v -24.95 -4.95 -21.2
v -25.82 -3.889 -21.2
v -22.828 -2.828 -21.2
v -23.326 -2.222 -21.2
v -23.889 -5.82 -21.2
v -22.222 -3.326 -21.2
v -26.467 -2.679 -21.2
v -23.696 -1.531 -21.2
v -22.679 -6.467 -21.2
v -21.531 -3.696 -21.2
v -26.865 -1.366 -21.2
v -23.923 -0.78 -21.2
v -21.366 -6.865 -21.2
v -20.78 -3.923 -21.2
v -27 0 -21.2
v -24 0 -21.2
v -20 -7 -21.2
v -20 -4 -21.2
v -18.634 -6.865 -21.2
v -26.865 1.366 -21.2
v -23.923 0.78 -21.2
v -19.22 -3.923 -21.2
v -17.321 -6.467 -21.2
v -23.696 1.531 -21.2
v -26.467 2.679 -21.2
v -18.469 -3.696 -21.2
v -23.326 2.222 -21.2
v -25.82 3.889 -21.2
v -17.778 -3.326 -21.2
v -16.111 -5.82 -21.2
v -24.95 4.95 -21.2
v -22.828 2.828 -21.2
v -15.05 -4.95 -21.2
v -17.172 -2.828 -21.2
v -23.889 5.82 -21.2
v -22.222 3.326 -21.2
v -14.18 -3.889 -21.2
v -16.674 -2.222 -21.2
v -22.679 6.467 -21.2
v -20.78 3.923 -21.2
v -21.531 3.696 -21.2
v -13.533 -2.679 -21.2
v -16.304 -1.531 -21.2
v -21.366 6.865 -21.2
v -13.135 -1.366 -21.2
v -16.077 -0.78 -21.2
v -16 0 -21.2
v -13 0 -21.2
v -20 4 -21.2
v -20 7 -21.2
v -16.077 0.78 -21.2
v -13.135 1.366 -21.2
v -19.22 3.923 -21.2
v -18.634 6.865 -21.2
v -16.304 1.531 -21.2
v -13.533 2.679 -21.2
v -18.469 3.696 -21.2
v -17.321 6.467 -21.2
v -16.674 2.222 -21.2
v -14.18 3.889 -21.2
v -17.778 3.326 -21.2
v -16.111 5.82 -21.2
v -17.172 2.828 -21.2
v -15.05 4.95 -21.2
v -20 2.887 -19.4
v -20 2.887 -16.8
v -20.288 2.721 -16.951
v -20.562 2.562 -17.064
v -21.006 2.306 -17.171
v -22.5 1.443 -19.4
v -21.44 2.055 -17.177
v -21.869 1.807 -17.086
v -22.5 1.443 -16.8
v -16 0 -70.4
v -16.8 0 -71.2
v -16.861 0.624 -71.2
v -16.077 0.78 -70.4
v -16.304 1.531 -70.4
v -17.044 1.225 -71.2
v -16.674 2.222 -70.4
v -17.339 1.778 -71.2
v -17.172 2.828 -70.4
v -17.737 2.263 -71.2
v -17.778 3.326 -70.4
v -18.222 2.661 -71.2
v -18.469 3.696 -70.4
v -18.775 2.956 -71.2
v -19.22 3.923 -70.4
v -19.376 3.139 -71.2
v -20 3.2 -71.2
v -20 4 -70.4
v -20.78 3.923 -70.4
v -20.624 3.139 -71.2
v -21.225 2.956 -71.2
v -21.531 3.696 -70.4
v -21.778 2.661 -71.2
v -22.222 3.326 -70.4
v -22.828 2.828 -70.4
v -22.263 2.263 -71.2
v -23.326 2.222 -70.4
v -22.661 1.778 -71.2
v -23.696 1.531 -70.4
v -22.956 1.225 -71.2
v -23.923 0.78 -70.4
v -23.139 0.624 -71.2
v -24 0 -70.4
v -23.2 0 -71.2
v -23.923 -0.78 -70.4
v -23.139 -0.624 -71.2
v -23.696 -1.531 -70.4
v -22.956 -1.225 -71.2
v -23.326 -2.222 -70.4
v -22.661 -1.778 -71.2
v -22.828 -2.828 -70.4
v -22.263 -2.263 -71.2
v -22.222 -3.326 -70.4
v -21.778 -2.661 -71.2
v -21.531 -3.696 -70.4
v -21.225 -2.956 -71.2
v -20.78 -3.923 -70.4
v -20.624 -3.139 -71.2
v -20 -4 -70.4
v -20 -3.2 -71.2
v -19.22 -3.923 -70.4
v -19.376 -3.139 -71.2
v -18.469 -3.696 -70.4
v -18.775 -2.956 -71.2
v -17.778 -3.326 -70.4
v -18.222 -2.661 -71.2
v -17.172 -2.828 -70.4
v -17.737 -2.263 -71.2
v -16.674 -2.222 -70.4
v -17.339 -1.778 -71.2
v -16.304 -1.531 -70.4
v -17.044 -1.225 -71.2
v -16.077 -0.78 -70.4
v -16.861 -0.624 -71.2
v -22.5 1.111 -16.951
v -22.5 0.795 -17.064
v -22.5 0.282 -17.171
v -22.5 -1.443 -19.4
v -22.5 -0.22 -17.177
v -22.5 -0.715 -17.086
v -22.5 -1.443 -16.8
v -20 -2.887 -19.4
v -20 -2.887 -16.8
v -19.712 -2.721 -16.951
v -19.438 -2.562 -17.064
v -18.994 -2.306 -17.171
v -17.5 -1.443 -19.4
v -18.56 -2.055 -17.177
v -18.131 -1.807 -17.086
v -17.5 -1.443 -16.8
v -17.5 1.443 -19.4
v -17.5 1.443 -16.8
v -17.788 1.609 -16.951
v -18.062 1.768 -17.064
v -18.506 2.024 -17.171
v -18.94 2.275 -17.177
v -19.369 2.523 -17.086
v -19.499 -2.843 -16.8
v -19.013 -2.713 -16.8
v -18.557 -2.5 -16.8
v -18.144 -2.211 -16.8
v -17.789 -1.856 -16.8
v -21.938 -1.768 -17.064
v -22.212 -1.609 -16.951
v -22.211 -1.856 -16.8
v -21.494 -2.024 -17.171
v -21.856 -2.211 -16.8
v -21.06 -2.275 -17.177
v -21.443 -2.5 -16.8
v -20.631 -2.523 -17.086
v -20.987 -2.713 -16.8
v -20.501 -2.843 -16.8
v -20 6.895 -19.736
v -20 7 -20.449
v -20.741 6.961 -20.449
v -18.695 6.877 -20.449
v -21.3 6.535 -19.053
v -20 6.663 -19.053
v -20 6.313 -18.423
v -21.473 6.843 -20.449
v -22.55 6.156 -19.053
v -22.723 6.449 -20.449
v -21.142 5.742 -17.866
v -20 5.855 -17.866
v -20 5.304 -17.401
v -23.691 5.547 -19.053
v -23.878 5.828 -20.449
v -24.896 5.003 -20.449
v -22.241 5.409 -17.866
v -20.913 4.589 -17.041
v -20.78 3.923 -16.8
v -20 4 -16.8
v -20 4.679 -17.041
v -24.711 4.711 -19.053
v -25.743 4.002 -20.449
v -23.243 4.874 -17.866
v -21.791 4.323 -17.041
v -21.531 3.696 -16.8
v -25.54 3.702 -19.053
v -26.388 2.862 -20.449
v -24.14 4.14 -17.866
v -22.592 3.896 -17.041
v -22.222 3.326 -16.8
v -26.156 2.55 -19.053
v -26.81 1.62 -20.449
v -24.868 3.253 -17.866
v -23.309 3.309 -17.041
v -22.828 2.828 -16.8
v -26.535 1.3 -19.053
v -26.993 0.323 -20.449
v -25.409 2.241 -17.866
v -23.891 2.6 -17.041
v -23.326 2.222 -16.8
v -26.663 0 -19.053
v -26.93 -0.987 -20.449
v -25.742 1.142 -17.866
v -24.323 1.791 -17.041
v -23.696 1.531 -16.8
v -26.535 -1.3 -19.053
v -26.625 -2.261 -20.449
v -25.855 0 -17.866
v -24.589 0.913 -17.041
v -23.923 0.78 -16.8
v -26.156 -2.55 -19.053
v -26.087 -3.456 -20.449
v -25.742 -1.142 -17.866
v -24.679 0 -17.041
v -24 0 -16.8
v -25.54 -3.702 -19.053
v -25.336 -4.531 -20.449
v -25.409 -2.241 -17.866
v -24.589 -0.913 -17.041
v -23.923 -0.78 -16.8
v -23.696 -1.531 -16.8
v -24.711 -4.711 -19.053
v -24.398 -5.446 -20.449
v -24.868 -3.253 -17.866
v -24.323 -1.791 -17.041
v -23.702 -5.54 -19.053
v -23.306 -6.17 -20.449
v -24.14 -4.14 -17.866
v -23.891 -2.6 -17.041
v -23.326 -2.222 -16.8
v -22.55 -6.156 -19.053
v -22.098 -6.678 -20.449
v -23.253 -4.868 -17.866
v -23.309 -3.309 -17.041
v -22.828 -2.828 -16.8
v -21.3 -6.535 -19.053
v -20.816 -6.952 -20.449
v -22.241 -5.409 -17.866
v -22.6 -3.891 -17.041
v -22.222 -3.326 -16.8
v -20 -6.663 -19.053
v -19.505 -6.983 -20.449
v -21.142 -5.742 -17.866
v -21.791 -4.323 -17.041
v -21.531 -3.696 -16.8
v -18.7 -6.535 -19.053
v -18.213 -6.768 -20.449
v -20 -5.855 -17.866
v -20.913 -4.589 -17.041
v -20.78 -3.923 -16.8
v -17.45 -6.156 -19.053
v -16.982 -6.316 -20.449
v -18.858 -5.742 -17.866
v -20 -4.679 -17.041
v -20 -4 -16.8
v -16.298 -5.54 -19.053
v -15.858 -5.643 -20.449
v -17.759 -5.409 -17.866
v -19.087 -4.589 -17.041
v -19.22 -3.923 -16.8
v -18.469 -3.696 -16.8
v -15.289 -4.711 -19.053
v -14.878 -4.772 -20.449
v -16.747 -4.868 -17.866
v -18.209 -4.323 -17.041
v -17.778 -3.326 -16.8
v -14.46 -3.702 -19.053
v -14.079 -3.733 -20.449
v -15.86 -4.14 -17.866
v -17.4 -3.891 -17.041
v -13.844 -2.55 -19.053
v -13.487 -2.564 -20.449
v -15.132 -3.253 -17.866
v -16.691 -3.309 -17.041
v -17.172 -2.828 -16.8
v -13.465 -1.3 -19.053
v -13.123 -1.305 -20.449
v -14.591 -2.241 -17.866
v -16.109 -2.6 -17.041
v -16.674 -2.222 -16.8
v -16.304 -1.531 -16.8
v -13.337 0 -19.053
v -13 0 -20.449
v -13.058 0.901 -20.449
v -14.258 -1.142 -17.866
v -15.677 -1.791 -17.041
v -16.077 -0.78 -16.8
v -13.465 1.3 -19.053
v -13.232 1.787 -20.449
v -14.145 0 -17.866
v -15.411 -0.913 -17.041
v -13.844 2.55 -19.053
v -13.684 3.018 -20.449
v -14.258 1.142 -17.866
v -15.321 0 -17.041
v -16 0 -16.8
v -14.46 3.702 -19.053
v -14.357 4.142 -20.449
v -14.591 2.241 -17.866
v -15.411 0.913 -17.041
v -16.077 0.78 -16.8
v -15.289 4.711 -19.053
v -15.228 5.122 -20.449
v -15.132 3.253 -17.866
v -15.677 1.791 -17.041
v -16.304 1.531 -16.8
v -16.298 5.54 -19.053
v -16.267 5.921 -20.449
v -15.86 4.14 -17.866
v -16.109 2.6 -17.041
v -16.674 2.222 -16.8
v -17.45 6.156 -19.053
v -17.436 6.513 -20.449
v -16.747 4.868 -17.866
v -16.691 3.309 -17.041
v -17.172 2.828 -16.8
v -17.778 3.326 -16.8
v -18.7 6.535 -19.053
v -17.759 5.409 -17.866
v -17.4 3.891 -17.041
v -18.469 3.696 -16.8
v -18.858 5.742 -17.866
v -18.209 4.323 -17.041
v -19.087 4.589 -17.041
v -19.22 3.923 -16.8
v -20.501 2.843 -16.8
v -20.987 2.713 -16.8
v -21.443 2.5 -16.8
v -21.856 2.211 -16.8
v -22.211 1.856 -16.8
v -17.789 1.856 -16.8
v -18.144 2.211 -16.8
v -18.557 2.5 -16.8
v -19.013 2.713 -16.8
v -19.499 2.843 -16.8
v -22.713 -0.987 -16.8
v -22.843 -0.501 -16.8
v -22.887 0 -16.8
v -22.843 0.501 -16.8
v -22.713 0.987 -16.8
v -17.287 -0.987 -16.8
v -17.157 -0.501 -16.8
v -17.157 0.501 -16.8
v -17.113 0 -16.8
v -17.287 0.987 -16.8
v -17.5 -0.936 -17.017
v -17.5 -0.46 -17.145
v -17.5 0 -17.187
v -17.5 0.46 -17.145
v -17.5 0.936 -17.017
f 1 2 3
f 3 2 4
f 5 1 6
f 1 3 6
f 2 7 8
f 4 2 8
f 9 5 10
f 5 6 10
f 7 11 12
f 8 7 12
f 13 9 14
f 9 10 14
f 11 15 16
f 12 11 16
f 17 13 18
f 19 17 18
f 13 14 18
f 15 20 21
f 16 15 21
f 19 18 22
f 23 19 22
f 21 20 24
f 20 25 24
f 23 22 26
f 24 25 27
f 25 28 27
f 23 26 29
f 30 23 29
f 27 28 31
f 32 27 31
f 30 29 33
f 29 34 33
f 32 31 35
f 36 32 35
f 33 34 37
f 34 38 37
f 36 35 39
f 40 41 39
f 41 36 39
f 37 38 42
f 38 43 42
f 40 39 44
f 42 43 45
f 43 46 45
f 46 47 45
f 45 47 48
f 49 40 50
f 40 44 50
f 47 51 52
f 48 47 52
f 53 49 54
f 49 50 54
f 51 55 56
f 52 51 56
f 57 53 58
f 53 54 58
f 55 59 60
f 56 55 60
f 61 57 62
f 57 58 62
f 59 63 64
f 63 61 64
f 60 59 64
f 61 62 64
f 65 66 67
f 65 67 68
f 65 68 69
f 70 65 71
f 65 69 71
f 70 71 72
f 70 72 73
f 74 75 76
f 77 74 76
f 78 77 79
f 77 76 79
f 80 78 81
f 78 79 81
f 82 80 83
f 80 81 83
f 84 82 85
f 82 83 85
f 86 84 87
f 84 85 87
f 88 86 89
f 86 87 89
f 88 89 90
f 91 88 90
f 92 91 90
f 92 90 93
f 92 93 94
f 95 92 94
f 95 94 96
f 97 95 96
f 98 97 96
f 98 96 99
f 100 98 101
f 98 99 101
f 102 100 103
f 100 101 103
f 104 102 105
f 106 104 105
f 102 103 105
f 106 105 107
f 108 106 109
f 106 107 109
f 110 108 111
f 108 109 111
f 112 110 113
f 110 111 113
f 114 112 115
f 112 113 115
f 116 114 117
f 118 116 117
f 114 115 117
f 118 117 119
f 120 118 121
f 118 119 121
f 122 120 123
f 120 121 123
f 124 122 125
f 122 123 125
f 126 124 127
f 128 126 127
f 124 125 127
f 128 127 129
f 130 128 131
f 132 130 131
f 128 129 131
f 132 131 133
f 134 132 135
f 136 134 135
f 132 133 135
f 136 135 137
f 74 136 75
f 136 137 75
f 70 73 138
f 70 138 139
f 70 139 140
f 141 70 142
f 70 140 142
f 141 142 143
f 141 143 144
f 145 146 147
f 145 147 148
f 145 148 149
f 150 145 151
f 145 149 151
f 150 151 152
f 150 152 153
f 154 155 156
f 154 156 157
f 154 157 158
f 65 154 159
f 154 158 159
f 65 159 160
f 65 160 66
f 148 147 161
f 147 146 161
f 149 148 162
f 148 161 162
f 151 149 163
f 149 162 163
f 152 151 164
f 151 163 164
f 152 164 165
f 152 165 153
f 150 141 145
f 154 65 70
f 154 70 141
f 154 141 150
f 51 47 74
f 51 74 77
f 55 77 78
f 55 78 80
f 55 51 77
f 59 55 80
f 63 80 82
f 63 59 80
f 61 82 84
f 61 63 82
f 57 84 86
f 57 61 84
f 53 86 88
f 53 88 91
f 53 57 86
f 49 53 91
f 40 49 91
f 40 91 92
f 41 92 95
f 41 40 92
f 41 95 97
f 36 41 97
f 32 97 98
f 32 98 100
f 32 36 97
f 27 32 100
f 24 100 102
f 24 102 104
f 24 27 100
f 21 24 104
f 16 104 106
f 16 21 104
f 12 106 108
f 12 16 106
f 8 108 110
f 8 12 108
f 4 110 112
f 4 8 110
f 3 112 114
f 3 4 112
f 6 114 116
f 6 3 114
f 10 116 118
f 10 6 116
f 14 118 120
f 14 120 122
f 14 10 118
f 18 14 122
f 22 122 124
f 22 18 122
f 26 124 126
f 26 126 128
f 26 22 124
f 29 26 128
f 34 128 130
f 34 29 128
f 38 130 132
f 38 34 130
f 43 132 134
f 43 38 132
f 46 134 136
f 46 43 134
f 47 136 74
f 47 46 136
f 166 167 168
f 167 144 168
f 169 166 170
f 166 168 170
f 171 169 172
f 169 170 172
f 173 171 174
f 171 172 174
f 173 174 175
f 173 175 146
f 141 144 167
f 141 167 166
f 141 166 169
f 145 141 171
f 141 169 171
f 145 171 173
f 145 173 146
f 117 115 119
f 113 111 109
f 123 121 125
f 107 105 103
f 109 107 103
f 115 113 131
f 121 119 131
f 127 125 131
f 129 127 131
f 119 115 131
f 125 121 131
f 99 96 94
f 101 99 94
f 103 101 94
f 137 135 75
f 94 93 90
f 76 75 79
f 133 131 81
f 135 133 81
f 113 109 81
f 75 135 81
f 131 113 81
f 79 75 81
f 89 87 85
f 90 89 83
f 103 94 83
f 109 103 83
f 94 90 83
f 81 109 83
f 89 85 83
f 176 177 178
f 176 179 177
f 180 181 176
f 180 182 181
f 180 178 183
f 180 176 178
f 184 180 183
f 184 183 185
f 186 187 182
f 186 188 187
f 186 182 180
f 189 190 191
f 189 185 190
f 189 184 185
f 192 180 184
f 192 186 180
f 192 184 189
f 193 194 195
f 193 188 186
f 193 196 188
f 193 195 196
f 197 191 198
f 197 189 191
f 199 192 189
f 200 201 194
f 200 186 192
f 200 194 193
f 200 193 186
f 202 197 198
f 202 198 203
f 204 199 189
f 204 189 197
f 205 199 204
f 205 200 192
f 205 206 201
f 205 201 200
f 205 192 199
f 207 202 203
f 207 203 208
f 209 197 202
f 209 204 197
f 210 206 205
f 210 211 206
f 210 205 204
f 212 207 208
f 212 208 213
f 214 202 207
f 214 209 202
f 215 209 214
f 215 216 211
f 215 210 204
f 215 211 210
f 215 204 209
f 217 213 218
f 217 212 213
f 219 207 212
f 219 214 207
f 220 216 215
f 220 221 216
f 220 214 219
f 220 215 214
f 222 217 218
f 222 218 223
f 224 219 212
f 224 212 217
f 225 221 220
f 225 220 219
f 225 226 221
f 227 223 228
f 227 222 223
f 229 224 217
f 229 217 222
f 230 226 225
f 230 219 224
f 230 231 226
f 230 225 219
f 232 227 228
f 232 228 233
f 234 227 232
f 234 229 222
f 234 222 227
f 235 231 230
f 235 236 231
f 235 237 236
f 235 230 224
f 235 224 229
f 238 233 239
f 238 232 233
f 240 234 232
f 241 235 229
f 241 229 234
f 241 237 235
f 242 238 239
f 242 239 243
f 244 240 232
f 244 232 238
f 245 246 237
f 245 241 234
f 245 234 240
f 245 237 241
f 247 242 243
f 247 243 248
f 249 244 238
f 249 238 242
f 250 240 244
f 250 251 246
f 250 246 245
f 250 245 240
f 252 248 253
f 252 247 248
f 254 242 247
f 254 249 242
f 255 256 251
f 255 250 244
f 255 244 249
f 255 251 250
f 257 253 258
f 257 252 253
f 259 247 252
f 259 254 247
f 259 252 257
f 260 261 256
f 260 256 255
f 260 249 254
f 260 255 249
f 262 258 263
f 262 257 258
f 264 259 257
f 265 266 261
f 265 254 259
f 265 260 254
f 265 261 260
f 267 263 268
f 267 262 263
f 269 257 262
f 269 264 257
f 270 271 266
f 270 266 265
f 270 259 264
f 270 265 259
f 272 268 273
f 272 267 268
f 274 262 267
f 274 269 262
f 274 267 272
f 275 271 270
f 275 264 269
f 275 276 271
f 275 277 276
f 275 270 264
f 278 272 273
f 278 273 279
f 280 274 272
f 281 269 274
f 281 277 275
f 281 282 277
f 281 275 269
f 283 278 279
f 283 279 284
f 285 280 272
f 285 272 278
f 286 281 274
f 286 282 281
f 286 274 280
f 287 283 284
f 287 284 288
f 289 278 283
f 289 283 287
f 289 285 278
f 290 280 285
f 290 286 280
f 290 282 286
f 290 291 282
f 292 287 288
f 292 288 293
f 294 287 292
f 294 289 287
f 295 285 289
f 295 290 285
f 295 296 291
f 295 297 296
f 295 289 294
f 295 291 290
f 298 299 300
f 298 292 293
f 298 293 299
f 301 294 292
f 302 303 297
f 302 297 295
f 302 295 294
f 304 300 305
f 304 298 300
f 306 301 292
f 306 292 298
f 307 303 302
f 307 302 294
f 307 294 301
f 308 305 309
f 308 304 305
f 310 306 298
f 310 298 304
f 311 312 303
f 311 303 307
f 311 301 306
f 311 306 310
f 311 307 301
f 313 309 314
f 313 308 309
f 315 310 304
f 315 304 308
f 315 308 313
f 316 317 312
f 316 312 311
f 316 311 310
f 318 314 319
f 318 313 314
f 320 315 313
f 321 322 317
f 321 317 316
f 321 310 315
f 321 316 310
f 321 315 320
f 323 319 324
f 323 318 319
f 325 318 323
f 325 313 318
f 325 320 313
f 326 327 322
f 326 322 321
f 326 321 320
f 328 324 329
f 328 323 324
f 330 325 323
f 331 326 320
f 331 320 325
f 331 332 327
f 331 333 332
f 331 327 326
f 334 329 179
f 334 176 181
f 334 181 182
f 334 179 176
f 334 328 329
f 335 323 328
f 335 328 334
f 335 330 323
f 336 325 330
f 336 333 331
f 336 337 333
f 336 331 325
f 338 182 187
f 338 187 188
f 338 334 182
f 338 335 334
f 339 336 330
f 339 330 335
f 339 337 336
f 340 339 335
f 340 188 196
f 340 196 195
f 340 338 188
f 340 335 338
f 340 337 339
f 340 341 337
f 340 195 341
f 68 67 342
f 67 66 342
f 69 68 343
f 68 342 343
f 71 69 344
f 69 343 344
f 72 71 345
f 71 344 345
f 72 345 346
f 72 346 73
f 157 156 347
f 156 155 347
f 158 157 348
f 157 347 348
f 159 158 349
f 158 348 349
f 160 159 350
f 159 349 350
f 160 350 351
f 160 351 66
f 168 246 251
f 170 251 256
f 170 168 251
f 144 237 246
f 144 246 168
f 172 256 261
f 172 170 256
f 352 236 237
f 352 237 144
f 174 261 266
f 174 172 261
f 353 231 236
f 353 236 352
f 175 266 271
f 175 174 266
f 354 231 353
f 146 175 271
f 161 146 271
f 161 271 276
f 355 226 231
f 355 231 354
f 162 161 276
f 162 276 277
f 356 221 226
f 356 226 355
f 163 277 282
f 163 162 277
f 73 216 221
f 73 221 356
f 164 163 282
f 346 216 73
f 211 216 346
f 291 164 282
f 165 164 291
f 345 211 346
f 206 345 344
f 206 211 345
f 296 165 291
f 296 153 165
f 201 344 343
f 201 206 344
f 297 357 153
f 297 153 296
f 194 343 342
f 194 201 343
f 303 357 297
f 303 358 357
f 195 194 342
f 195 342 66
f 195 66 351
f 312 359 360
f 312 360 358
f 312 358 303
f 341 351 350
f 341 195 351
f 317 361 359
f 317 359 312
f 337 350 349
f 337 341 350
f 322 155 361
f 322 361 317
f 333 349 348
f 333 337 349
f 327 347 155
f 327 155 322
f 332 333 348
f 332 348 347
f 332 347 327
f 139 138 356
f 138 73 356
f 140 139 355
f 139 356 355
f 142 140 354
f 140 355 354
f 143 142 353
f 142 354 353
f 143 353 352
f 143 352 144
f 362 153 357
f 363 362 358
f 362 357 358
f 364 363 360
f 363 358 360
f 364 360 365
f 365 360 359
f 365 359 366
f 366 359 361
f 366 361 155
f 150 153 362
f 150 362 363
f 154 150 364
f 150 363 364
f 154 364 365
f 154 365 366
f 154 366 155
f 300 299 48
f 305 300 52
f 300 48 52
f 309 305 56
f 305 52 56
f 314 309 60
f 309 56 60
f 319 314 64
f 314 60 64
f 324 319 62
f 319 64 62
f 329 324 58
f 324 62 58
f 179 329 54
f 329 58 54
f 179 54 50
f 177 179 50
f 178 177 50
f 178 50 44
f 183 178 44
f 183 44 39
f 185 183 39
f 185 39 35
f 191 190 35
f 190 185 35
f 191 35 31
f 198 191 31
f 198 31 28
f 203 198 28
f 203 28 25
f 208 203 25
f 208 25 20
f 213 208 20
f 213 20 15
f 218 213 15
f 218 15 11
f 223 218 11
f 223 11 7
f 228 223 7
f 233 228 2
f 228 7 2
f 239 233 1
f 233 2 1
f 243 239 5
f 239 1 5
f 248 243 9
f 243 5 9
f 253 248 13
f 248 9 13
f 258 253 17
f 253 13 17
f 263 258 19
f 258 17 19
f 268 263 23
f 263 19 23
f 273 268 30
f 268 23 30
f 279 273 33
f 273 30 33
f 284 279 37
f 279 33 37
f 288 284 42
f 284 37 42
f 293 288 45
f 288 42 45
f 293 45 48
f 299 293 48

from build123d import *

# Parameters (mm, degrees)
BOSS_EXTRUDE1_START = -21.2
SKETCH1_R           = 4
BOSS_EXTRUDE1_DEPTH = 50
SKETCH2_R           = 7
BOSS_EXTRUDE2_DEPTH = 4.4
CUT_EXTRUDE1_DEPTH  = 2.6
SKETCH5_R           = 2.886751346
CUT_EXTRUDE2_DEPTH  = 1
CUT_EXTRUDE2_DRAFT  = -45
CHAMFER1_SIZE       = 0.8


with BuildPart() as part:
    # Sketch1 → Boss-Extrude1 (new body)
    with BuildSketch(Plane.XY.offset(BOSS_EXTRUDE1_START)):
        with Locations((-20, 0)):
            Circle(SKETCH1_R)
    extrude(amount=-BOSS_EXTRUDE1_DEPTH)

    # Sketch2 → Boss-Extrude2 (add)
    with BuildSketch(Plane.XY.offset(-21.2)):
        with Locations((-20, 0)):
            Circle(SKETCH2_R)
    extrude(amount=BOSS_EXTRUDE2_DEPTH)

    # Sketch3 → Cut-Revolve1 (revolve, cut)
    with BuildSketch(Plane(origin=(-20, 0, 0), x_dir=(0, 0, -1), z_dir=(1, 0, 0))):
        with BuildLine():
            Line((16.8, 4), (15.8, 4))
            Line((15.8, 4), (15.8, 8))
            Line((15.8, 8), (20.9, 8))
            Line((20.9, 8), (20.9, 7))
            ThreePointArc((20.9, 7), (18.312578573, 6.23447595), (16.8, 4))
        make_face()
    revolve(axis=Axis((-20, 0, -71.2), (0, 0, 1)), mode=Mode.SUBTRACT)

    # Sketch4 → Cut-Extrude1 (cut)
    with BuildSketch(Plane.XY.offset(-16.8)):
        Polygon((-20, 2.886751346), (-22.5, 1.443375673), (-22.5, -1.443375673), (-20, -2.886751346), (-17.5, -1.443375673), (-17.5, 1.443375673), align=None)
    extrude(amount=-CUT_EXTRUDE1_DEPTH, mode=Mode.SUBTRACT)


with BuildPart() as cut_extrude2_tool:
    # Sketch5 → Cut-Extrude2 (with draft: the straight prism first)
    with BuildSketch(Plane.XY.offset(-16.8)):
        with Locations((-20, 0)):
            Circle(SKETCH5_R)
    extrude(amount=-CUT_EXTRUDE2_DEPTH)
    # Cut-Extrude2: the draft: its side faces are tilted about the plane it starts from
    cut_extrude2_sides = [cut_extrude2_tool.faces().sort_by_distance(p)[0] for p in [
        (-22.886751346, 0, -17.3),
    ]]
    draft(cut_extrude2_sides, Plane.XY.offset(-16.8), CUT_EXTRUDE2_DRAFT)


with BuildPart() as part_1:
    add(part.part)

    # Cut-Extrude2: cut by cut_extrude2_tool
    add(cut_extrude2_tool.part, mode=Mode.SUBTRACT)

    # Chamfer1
    chamfer1_edges = [part_1.edges().sort_by_distance(p)[0] for p in [
        (-24, 0, -71.2),
    ]]
    chamfer(chamfer1_edges, length=CHAMFER1_SIZE)


solid = part_1.part
